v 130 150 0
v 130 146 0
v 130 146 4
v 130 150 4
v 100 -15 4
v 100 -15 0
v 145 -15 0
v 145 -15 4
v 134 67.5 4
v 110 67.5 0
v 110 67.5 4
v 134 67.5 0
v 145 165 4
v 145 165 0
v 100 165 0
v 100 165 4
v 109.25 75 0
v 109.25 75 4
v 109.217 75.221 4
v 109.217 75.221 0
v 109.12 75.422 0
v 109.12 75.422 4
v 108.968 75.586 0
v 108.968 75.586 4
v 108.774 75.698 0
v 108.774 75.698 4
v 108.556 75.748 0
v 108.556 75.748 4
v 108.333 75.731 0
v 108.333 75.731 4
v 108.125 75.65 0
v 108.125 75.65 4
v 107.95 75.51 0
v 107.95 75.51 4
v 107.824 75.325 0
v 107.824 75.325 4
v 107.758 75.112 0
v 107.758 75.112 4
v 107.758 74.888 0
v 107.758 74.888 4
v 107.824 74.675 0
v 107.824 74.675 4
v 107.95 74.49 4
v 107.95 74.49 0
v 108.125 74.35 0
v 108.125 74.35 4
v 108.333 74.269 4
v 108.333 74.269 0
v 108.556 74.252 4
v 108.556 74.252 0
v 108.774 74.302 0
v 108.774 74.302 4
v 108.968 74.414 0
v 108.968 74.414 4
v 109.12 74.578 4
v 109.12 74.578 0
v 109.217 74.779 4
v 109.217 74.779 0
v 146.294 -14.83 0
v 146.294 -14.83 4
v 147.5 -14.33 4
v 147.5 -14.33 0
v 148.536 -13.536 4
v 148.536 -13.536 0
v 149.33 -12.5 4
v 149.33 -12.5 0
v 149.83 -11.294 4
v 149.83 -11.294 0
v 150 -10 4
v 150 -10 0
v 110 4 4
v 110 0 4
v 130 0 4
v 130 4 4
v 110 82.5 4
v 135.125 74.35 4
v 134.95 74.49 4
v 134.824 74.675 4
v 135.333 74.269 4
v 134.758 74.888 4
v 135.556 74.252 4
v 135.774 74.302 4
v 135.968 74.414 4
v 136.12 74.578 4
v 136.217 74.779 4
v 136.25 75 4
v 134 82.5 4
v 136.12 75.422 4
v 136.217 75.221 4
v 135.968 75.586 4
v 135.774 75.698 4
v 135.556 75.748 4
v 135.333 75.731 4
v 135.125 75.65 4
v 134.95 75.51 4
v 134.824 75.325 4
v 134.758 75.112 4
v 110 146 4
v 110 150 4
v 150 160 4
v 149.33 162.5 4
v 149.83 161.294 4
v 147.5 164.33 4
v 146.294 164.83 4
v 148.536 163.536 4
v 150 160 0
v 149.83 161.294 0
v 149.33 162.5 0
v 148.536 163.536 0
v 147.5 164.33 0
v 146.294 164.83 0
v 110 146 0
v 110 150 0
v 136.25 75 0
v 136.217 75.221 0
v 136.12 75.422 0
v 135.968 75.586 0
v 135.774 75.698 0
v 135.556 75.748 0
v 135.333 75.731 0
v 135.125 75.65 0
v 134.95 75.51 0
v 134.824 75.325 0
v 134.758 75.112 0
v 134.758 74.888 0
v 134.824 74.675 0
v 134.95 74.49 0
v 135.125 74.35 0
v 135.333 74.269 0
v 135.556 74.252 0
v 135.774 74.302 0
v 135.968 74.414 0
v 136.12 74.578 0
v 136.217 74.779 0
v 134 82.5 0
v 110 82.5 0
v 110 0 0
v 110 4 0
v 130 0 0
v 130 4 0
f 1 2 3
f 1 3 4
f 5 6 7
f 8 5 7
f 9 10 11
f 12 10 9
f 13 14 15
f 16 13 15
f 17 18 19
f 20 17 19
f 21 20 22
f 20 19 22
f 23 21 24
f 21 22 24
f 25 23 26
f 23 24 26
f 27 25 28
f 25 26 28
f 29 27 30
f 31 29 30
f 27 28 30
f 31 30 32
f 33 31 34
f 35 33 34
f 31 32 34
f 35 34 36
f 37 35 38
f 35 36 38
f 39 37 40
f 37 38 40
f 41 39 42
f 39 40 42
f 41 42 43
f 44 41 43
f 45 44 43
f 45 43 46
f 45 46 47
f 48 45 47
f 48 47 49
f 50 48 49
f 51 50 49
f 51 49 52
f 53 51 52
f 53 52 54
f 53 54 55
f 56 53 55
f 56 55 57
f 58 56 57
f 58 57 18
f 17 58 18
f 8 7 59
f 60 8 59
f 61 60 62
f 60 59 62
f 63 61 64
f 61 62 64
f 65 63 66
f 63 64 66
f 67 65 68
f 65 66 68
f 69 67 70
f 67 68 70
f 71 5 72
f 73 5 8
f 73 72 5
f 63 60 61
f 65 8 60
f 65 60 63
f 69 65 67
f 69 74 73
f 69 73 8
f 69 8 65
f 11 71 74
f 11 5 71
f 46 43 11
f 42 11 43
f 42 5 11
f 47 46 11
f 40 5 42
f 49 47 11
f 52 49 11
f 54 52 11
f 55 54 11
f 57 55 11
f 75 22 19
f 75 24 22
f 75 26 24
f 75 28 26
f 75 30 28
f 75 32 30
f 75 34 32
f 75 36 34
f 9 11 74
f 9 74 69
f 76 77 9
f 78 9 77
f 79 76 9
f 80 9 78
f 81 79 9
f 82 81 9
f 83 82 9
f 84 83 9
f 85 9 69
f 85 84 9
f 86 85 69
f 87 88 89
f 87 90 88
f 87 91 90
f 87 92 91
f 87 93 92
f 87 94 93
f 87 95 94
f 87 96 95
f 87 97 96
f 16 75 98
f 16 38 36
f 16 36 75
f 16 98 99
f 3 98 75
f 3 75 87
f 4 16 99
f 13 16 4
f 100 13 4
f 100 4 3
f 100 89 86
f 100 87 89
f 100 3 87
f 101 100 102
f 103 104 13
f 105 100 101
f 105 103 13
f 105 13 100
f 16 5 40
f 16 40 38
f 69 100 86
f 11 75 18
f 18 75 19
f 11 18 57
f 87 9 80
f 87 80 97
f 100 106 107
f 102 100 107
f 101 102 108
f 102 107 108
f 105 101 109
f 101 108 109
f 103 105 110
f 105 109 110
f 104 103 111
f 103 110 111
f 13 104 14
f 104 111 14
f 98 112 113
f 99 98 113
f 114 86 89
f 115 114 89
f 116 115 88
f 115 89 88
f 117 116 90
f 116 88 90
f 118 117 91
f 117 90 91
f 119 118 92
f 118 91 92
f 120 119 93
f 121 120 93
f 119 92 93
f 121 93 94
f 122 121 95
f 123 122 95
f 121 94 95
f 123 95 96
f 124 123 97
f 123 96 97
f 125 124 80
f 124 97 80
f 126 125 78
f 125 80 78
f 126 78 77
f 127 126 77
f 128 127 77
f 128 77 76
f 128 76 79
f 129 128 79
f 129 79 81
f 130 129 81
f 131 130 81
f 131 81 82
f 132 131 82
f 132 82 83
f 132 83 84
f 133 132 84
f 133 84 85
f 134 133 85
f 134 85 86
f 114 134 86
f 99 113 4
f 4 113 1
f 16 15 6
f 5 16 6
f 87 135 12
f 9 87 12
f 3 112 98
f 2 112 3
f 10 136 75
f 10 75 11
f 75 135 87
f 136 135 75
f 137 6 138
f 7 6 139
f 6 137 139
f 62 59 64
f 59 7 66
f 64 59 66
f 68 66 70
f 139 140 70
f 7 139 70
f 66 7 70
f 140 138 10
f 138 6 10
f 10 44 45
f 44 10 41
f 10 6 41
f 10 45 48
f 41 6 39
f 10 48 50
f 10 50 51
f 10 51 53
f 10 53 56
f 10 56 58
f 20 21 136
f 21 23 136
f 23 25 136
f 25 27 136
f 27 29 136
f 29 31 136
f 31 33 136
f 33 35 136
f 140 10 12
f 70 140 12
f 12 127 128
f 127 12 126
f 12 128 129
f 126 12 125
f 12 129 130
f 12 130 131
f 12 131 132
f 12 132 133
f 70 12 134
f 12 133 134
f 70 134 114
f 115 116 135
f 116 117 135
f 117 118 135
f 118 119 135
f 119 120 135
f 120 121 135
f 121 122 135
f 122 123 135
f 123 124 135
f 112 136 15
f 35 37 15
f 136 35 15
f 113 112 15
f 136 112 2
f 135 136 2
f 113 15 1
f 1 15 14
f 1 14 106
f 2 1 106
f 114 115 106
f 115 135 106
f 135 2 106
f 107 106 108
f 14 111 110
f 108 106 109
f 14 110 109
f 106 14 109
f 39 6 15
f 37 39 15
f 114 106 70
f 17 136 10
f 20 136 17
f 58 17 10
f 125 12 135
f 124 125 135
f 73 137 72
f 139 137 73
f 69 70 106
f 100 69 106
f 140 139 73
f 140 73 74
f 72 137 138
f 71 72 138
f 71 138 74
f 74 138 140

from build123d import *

# Parameters (mm, degrees)
SKETCH002_W  = 20
SKETCH002_H  = 4
PAD_DEPTH    = 4
SKETCH003_R  = 0.75
POCKET_DEPTH = 5


with BuildPart() as part:
    # Sketch002 → Pad (new body)
    with BuildSketch(Plane.XY):
        with BuildLine():
            Line((100, 165), (100, -15))
            Line((100, -15), (145, -15))
            ThreePointArc((145, -15), (148.535534, -13.535534), (150, -10))
            Line((150, -10), (150, 0))
            Line((150, 0), (150, 150))
            Line((150, 150), (150, 160))
            ThreePointArc((150, 160), (148.535534, 163.535534), (145, 165))
            Line((145, 165), (100, 165))
        make_face()
        Polygon((110, 82.5), (110, 67.5), (134, 67.5), (134, 75), (134, 82.5), align=None, mode=Mode.SUBTRACT)
        with Locations((120, 148)):
            Rectangle(SKETCH002_W, SKETCH002_H, mode=Mode.SUBTRACT)
        with Locations((120, 2)):
            Rectangle(SKETCH002_W, SKETCH002_H, mode=Mode.SUBTRACT)
    extrude(amount=PAD_DEPTH)

    # Sketch003 (on Face18 of Pad) → Pocket (cut)
    with BuildSketch(Plane.XY.offset(4)):
        with Locations((108.5, 75)):
            Circle(SKETCH003_R)
        with Locations((135.5, 75)):
            Circle(SKETCH003_R)
    extrude(amount=-POCKET_DEPTH, mode=Mode.SUBTRACT)


solid = part.part
